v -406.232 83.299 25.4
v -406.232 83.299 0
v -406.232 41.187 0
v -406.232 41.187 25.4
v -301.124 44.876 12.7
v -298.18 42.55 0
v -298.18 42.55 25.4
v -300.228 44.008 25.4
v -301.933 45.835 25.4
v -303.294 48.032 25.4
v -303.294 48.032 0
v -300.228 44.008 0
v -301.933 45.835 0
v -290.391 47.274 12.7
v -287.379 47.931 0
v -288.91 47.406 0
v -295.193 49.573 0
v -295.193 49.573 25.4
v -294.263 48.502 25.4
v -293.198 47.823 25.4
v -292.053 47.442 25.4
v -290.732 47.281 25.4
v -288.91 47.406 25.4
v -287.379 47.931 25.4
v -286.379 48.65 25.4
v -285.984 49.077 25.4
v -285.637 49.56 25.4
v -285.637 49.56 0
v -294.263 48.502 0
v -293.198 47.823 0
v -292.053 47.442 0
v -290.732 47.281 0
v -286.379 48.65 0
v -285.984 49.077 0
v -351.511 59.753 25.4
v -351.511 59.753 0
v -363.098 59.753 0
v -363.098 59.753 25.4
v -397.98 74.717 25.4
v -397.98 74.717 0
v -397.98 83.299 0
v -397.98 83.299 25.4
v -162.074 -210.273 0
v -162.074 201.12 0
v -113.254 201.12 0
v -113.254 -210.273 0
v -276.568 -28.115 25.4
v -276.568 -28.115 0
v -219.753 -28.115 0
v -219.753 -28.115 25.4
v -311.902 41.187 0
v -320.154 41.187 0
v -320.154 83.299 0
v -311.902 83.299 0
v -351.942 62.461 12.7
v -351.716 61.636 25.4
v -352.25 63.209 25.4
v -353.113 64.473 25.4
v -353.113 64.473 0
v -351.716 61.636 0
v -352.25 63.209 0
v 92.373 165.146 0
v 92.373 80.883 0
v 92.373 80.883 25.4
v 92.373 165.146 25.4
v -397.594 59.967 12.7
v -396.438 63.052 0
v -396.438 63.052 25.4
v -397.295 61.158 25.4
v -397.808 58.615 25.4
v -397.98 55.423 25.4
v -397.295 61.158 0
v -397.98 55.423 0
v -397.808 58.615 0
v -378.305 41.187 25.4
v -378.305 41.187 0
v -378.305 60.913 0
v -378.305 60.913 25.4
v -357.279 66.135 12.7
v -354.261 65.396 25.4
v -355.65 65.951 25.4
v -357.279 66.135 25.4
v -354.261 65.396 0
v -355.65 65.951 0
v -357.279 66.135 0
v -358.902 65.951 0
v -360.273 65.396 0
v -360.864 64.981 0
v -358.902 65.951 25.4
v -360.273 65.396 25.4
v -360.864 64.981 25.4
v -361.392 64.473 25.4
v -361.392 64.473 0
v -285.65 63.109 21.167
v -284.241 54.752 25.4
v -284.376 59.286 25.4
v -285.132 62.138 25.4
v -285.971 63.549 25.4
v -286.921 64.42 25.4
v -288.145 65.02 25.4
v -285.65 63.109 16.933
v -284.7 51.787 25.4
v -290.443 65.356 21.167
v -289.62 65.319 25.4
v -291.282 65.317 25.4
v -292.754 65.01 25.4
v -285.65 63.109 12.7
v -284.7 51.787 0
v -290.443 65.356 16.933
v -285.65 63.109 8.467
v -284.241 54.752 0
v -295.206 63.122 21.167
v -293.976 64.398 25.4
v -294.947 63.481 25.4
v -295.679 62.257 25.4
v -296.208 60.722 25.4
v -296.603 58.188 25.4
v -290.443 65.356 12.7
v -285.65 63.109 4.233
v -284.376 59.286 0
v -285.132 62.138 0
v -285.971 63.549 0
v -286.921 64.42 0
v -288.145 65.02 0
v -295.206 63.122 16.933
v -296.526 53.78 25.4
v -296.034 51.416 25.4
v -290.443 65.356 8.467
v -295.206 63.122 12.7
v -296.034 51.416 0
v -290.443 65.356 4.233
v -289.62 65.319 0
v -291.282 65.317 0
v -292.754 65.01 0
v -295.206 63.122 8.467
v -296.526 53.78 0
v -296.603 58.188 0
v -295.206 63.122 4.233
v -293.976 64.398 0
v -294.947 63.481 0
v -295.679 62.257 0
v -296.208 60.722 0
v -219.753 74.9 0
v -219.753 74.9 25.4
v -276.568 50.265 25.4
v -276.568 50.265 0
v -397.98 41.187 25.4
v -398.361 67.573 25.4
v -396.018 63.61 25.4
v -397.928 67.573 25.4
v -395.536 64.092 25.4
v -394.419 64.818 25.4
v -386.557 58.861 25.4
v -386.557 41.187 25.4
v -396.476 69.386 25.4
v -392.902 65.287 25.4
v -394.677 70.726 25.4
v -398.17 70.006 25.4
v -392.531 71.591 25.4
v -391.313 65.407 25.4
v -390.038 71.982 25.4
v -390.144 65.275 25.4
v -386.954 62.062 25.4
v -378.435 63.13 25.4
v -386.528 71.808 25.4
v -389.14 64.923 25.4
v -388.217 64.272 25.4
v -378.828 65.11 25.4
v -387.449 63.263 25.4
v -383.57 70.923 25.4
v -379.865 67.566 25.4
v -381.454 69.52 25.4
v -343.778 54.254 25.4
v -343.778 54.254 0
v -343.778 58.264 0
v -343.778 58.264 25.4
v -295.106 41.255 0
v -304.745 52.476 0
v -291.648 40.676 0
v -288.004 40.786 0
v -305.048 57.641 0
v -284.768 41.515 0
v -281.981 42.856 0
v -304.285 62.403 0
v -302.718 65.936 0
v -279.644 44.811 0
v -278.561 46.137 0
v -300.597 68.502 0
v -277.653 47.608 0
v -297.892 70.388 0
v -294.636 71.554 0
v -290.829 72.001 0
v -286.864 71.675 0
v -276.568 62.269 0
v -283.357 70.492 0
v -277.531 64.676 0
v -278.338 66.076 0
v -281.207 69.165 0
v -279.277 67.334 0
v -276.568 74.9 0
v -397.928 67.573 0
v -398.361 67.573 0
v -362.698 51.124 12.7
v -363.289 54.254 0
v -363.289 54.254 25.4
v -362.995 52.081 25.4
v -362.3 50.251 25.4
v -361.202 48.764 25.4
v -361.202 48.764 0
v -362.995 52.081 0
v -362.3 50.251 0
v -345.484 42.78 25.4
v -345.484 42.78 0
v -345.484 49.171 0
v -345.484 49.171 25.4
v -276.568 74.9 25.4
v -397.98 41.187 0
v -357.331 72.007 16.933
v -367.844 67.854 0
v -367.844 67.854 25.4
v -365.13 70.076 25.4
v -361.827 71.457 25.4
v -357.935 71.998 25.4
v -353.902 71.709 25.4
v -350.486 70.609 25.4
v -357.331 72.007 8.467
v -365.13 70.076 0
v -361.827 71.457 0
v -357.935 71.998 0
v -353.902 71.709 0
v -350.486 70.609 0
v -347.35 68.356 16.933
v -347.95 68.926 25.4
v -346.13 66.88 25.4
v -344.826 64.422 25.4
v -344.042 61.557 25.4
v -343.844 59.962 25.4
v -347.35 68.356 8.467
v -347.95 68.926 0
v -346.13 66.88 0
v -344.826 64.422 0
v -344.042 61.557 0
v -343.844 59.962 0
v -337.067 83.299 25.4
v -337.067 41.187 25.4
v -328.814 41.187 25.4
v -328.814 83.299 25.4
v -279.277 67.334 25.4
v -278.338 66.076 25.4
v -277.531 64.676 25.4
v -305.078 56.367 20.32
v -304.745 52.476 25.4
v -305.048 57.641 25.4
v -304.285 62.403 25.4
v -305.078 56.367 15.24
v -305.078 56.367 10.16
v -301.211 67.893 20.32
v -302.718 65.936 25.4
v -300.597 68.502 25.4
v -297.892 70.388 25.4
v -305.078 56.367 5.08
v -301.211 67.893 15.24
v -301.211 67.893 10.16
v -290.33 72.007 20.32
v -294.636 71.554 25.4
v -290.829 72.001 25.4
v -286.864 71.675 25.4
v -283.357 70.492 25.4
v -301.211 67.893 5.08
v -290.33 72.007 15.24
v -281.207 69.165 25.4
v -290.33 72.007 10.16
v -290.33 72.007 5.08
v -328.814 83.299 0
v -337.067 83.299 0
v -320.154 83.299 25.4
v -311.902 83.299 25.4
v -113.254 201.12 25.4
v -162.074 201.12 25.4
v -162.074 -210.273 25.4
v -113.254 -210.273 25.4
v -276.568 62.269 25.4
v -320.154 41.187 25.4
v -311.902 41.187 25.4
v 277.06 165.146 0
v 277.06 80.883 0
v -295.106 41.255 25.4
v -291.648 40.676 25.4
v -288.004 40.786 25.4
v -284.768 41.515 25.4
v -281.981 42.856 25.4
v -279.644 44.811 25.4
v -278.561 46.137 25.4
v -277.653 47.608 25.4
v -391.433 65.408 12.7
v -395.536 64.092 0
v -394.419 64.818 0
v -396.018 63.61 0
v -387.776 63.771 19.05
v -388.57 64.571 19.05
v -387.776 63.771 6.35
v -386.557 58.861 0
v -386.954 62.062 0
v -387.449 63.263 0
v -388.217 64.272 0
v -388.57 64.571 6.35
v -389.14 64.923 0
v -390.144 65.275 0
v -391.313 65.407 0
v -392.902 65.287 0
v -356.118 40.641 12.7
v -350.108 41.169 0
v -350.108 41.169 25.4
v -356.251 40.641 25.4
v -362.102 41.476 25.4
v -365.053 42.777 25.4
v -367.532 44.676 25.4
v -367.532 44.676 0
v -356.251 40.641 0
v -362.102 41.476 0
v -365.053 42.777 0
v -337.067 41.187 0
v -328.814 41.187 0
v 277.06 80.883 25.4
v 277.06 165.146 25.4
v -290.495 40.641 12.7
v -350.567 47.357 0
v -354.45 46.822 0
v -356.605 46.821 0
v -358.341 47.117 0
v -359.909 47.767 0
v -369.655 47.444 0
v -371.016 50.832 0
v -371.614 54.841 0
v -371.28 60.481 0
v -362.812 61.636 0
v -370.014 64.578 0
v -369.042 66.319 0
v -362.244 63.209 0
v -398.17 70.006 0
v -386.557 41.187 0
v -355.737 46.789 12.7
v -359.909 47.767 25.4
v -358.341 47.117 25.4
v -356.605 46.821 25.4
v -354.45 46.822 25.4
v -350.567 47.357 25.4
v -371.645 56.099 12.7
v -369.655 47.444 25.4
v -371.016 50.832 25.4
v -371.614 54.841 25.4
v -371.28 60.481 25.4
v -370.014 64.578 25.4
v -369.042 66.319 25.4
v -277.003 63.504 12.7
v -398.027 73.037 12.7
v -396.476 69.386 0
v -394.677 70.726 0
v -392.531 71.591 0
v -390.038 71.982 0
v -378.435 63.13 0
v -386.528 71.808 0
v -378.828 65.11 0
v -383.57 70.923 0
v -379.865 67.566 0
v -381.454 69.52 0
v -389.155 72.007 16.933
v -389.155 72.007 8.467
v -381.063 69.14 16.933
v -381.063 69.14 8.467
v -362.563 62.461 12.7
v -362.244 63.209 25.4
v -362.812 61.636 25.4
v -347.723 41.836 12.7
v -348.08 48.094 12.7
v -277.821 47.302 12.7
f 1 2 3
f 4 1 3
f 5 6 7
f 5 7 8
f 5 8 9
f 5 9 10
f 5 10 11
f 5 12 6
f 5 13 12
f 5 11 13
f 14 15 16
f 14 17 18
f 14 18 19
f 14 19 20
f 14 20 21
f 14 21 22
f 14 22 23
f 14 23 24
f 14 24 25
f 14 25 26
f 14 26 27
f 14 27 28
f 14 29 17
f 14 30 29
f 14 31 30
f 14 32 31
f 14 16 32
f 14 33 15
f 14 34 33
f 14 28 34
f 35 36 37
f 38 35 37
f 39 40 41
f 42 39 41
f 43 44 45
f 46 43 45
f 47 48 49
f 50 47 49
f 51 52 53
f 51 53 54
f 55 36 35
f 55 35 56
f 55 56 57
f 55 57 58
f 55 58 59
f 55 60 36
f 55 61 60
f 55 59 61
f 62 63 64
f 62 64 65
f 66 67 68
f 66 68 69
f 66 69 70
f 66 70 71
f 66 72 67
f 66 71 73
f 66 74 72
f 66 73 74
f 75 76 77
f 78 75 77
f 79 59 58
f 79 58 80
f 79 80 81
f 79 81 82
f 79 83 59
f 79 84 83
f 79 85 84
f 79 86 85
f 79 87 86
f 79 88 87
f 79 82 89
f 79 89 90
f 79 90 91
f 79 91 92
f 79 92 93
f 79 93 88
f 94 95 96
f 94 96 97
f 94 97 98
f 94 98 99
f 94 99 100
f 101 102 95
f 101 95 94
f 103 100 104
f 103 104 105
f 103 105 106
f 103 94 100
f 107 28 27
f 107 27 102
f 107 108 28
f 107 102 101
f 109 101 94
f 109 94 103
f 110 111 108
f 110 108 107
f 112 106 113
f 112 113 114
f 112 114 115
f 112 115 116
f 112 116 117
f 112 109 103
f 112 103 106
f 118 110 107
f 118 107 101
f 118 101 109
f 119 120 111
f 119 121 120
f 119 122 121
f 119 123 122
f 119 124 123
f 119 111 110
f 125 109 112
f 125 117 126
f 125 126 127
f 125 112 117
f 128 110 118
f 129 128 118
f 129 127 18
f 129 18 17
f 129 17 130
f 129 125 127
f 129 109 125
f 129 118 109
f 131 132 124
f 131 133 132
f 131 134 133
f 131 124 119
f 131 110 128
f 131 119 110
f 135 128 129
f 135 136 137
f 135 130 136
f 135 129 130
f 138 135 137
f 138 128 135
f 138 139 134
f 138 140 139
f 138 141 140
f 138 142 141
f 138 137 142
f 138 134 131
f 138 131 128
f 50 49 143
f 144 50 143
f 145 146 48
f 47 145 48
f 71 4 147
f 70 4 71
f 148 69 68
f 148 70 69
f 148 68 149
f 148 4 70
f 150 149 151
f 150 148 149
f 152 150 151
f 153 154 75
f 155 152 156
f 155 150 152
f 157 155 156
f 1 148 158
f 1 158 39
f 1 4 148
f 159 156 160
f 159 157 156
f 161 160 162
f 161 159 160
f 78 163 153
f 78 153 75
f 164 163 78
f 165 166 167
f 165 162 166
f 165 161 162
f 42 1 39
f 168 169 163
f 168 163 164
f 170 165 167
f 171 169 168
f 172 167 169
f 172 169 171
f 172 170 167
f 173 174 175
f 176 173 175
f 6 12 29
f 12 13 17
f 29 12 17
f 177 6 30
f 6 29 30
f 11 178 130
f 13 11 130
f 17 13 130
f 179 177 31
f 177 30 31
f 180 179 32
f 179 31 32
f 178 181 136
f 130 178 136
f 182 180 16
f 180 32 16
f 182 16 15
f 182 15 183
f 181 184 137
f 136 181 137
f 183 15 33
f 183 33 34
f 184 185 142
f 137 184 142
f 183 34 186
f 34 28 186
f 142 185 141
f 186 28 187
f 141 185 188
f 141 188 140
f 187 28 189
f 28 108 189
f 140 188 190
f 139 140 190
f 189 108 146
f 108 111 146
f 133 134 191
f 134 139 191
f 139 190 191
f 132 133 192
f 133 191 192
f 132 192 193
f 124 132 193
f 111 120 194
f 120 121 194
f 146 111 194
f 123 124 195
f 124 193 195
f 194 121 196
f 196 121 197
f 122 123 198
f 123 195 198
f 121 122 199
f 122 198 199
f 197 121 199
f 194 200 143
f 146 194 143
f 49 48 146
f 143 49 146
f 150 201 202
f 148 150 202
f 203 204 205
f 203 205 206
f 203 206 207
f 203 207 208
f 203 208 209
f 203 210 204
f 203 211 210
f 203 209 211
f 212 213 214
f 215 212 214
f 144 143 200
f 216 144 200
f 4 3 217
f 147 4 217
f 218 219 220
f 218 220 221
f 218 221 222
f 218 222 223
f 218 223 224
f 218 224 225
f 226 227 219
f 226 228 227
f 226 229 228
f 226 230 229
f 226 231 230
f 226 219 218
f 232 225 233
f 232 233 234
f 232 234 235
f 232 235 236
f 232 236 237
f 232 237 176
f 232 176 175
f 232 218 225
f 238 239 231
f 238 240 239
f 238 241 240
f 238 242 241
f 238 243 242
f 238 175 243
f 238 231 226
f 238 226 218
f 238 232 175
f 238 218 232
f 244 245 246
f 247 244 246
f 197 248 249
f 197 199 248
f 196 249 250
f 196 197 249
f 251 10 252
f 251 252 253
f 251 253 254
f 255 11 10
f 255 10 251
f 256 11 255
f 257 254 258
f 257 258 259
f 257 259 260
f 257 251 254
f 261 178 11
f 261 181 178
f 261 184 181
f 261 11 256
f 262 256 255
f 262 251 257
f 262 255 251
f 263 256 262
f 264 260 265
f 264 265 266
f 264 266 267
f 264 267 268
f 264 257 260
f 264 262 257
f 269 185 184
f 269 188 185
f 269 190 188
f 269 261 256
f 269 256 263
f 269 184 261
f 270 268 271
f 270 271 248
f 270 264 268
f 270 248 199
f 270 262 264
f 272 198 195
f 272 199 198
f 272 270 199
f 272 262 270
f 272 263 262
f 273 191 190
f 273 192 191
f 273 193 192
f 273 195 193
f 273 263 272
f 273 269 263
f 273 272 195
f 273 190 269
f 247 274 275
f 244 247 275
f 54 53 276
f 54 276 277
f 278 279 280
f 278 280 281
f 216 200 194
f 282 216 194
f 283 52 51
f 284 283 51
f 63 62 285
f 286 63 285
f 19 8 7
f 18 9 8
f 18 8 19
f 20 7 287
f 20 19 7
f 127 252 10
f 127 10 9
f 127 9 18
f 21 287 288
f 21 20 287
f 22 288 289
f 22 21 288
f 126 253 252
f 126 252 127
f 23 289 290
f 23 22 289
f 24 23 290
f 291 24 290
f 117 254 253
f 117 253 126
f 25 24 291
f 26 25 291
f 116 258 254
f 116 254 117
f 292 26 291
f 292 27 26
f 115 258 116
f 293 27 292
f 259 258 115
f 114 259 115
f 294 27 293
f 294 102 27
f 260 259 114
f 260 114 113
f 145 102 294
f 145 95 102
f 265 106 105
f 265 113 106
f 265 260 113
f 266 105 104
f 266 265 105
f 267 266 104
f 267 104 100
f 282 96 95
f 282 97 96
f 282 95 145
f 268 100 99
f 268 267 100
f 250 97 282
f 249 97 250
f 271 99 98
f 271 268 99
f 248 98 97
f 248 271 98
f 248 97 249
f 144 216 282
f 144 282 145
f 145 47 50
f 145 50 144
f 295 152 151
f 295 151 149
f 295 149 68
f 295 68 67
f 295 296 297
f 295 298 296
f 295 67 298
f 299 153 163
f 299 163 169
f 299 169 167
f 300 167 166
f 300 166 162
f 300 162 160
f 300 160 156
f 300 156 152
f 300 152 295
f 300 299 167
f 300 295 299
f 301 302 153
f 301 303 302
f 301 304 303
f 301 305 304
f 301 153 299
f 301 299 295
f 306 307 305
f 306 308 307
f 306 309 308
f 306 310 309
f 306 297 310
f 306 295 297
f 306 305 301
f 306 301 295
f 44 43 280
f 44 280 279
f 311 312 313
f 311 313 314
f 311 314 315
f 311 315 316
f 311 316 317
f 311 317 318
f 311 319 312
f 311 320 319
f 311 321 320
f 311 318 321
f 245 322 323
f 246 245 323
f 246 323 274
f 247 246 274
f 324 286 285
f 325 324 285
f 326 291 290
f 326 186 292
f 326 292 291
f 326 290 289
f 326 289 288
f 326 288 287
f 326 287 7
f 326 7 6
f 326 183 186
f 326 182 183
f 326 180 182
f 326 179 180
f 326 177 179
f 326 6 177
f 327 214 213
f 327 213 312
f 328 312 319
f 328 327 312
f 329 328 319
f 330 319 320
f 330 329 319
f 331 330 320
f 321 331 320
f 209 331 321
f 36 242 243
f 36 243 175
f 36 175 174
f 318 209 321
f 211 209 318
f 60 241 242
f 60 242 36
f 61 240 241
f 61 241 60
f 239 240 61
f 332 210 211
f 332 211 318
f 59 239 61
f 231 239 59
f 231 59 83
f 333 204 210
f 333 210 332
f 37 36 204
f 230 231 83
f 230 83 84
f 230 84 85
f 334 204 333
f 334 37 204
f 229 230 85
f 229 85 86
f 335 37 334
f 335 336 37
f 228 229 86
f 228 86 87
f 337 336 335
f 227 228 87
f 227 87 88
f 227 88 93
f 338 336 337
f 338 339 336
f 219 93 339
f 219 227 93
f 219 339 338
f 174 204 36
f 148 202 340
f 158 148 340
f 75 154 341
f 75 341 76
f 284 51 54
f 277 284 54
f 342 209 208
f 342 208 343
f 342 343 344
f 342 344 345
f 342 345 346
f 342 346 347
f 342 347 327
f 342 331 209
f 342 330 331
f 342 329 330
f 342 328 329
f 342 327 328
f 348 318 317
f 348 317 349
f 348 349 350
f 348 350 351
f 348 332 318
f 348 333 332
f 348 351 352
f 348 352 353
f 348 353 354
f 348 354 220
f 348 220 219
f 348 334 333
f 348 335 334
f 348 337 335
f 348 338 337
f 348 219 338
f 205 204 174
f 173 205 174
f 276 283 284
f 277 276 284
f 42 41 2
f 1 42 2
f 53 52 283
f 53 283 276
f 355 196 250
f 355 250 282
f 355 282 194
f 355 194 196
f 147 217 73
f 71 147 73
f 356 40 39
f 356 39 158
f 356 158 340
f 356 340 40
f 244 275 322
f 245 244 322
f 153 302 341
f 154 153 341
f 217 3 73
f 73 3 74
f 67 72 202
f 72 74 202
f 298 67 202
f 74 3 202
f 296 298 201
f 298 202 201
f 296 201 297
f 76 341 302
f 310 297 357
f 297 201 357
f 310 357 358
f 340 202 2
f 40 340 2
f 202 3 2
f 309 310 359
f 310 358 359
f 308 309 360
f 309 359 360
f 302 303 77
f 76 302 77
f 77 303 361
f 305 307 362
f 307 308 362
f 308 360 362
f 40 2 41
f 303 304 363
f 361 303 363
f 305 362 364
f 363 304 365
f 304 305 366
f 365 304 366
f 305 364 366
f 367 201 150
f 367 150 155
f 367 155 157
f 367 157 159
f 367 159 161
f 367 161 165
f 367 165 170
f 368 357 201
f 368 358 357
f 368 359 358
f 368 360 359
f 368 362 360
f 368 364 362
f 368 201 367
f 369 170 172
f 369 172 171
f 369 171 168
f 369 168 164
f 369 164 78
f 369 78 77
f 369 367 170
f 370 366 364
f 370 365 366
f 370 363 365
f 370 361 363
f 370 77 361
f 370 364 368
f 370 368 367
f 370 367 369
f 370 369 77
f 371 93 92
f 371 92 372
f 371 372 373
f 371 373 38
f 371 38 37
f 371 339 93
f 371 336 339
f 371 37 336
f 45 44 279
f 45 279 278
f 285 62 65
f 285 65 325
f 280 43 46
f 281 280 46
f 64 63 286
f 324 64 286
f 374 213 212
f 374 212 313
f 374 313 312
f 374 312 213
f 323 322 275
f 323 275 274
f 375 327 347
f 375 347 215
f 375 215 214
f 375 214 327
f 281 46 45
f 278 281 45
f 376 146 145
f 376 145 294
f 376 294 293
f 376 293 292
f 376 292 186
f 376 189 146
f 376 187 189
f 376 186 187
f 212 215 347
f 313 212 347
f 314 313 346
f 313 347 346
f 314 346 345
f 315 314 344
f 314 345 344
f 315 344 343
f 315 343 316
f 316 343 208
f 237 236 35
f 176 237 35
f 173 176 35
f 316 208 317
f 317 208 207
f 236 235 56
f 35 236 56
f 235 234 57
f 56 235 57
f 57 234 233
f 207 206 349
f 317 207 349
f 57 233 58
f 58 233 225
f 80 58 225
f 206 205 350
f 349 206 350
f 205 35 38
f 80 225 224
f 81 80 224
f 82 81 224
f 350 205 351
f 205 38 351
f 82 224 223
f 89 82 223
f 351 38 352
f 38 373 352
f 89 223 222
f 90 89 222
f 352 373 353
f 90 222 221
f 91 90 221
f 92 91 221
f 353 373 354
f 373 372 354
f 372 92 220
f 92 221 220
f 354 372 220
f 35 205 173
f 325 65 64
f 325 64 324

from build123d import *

# Parameters (mm, degrees)
F0_W     = 184.6868768334
F0_H     = 84.2627063394
F0_W_2   = 48.8200113177
F0_H_2   = 411.3924652338
F0_W_3   = 8.2527426776
F0_H_3   = 42.1123689836
F1_DEPTH = 25.4


with BuildPart() as f1:
    # F0 (on Top) → F1 (new body)
    with BuildSketch(Plane.XY):
        with Locations((184.7166828811, 123.0147741735)):
            Rectangle(F0_W, F0_H)
        with Locations((-137.6638747752, -4.5765265822)):
            Rectangle(F0_W_2, F0_H_2)
        with BuildLine():
            Line((-386.5573875373, 41.1865082052), (-378.3046448597, 41.1865082052))
            Line((-378.3046448597, 41.1865082052), (-378.3046448597, 60.9134209226))
            add(Edge.make_bspline(
                [(-381.0627755447, 69.1401843473), (-378.3046448597, 66.2738067751), (-378.3046448597, 60.9134209226)],
                knots=[0, 0, 0, 1, 1, 1], degree=2))
            add(Edge.make_bspline(
                [(-389.1553128293, 72.0065619195), (-383.8209062297, 72.0065619195), (-381.0627755447, 69.1401843473)],
                knots=[0, 0, 0, 1, 1, 1], degree=2))
            add(Edge.make_bspline(
                [(-397.9276405654, 67.5727694211), (-395.1651800049, 72.0065619195), (-389.1553128293, 72.0065619195)],
                knots=[0, 0, 0, 1, 1, 1], degree=2))
            Line((-397.9276405654, 67.5727694211), (-398.3606281141, 67.5727694211))
            Line((-398.3606281141, 67.5727694211), (-398.1701135926, 70.0061594447))
            add(Edge.make_bspline(
                [(-397.9795990712, 74.7170639742), (-397.9795990712, 73.7125328613), (-398.1701135926, 70.0061594447)],
                knots=[0, 0, 0, 1, 1, 1], degree=2))
            Line((-397.9795990712, 74.7170639742), (-397.9795990712, 83.2988771888))
            Line((-397.9795990712, 83.2988771888), (-406.2323417489, 83.2988771888))
            Line((-406.2323417489, 83.2988771888), (-406.2323417489, 41.1865082052))
            Line((-406.2323417489, 41.1865082052), (-397.9795990712, 41.1865082052))
            Line((-397.9795990712, 41.1865082052), (-397.9795990712, 55.4231388055))
            add(Edge.make_bspline(
                [(-396.438163398, 63.052379413), (-397.9795990712, 60.6969271483), (-397.9795990712, 55.4231388055)],
                knots=[0, 0, 0, 1, 1, 1], degree=2))
            add(Edge.make_bspline(
                [(-391.4328273353, 65.4078316778), (-394.8967277247, 65.4078316778), (-396.438163398, 63.052379413)],
                knots=[0, 0, 0, 1, 1, 1], degree=2))
            add(Edge.make_bspline(
                [(-386.5573875373, 58.8610599419), (-386.5573875373, 65.4078316778), (-391.4328273353, 65.4078316778)],
                knots=[0, 0, 0, 1, 1, 1], degree=2))
            Line((-386.5573875373, 58.8610599419), (-386.5573875373, 41.1865082052))
        make_face()
        Polygon((-336.9529306078, 41.1865082052), (-328.8141680467, 41.1865082052), (-328.8141680467, 83.2988771888), (-337.0669107244, 83.2988771888), (-337.0669107244, 41.1865082052), align=None)
        with Locations((-316.0280457345, 62.242692697)):
            Rectangle(F0_W_3, F0_H_3)
        with BuildLine():
            Line((-276.5679955482, 50.2645032945), (-276.5679955482, -28.1147938222))
            Line((-276.5679955482, -28.1147938222), (-219.7534025482, -28.1147938222))
            Line((-219.7534025482, -28.1147938222), (-219.7534025482, 74.9002173543))
            Line((-219.7534025482, 74.9002173543), (-276.5679955482, 74.9002173543))
            Line((-276.5679955482, 74.9002173543), (-276.5679955482, 62.2686307575))
            add(Edge.make_bspline(
                [(-276.5679955482, 62.2686307575), (-275.7472140818, 59.5977436271), (-275.7472140818, 56.3670516616)],
                knots=[0.3216911884, 0.3216911884, 0.3216911884, 1, 1, 1], degree=2))
            add(Edge.make_bspline(
                [(-275.7472140818, 56.3670516616), (-275.7472140818, 52.9769771283), (-276.5679955482, 50.2645032945)],
                knots=[0, 0, 0, 0.4589388385, 0.4589388385, 0.4589388385], degree=2))
        make_face()
        with BuildLine():
            add(Edge.make_bspline(
                [(-356.1183628659, 40.6409438939), (-363.4185329364, 40.6409438939), (-367.5319146488, 44.6763878475)],
                knots=[0, 0, 0, 1, 1, 1], degree=2))
            add(Edge.make_bspline(
                [(-350.1084956903, 41.1691887033), (-352.5678649668, 40.6409438939), (-356.1183628659, 40.6409438939)],
                knots=[0, 0, 0, 1, 1, 1], degree=2))
            add(Edge.make_bspline(
                [(-345.4841886705, 42.7799023843), (-347.6491264139, 41.6974335126), (-350.1084956903, 41.1691887033)],
                knots=[0, 0, 0, 1, 1, 1], degree=2))
            Line((-345.4841886705, 42.7799023843), (-345.4841886705, 49.1707986027))
            add(Edge.make_bspline(
                [(-350.5674624919, 47.3565807737), (-348.1340724684, 47.9237944625), (-345.4841886705, 49.1707986027)],
                knots=[0, 0, 0, 1, 1, 1], degree=2))
            add(Edge.make_bspline(
                [(-355.737333823, 46.789367085), (-353.0008525154, 46.789367085), (-350.5674624919, 47.3565807737)],
                knots=[0, 0, 0, 1, 1, 1], degree=2))
            add(Edge.make_bspline(
                [(-361.2016366872, 48.7637903069), (-359.2531927182, 46.789367085), (-355.737333823, 46.789367085)],
                knots=[0, 0, 0, 1, 1, 1], degree=2))
            add(Edge.make_bspline(
                [(-363.2886366718, 54.2540724241), (-363.1500806562, 50.7382135289), (-361.2016366872, 48.7637903069)],
                knots=[0, 0, 0, 1, 1, 1], degree=2))
            Line((-363.2886366718, 54.2540724241), (-343.7782177288, 54.2540724241))
            Line((-343.7782177288, 54.2540724241), (-343.7782177288, 58.2635371247))
            add(Edge.make_bspline(
                [(-347.3503650053, 68.3564768842), (-343.7782177288, 64.7063918489), (-343.7782177288, 58.2635371247)],
                knots=[0, 0, 0, 1, 1, 1], degree=2))
            add(Edge.make_bspline(
                [(-357.3307280021, 72.0065619195), (-350.9225122818, 72.0065619195), (-347.3503650053, 68.3564768842)],
                knots=[0, 0, 0, 1, 1, 1], degree=2))
            add(Edge.make_bspline(
                [(-367.8436656838, 67.8542113278), (-364.0420350065, 72.0065619195), (-357.3307280021, 72.0065619195)],
                knots=[0, 0, 0, 1, 1, 1], degree=2))
            add(Edge.make_bspline(
                [(-371.6452963611, 56.0985993814), (-371.6452963611, 63.701860736), (-367.8436656838, 67.8542113278)],
                knots=[0, 0, 0, 1, 1, 1], degree=2))
            add(Edge.make_bspline(
                [(-367.5319146488, 44.6763878475), (-371.6452963611, 48.7118318011), (-371.6452963611, 56.0985993814)],
                knots=[0, 0, 0, 1, 1, 1], degree=2))
        make_face()
        with BuildLine():
            add(Edge.make_bspline(
                [(-357.2787694963, 66.1352507595), (-359.9026740412, 66.1352507595), (-361.3921512086, 64.4725785727)],
                knots=[0, 0, 0, 1, 1, 1], degree=2))
            add(Edge.make_bspline(
                [(-353.1134292781, 64.4725785727), (-354.6548649513, 66.1352507595), (-357.2787694963, 66.1352507595)],
                knots=[0, 0, 0, 1, 1, 1], degree=2))
            add(Edge.make_bspline(
                [(-351.511375348, 59.7530142922), (-351.5719936048, 62.8099063858), (-353.1134292781, 64.4725785727)],
                knots=[0, 0, 0, 1, 1, 1], degree=2))
            Line((-351.511375348, 59.7530142922), (-363.0981221504, 59.7530142922))
            add(Edge.make_bspline(
                [(-361.3921512086, 64.4725785727), (-362.8816283761, 62.8099063858), (-363.0981221504, 59.7530142922)],
                knots=[0, 0, 0, 1, 1, 1], degree=2))
        make_face(mode=Mode.SUBTRACT)
        with BuildLine():
            add(Edge.make_bspline(
                [(-276.5679955482, 50.2645032945), (-277.5356473057, 47.0666605317), (-279.6441020198, 44.8106139876)],
                knots=[0.4589388385, 0.4589388385, 0.4589388385, 1, 1, 1], degree=2))
            Line((-276.5679955482, 50.2645032945), (-276.5679955482, 62.2686307575))
            add(Edge.make_bspline(
                [(-277.5311227823, 64.6760827205), (-276.9572550725, 63.5353117149), (-276.5679955482, 62.2686307575)],
                knots=[0, 0, 0, 0.3216911884, 0.3216911884, 0.3216911884], degree=2))
            add(Edge.make_bspline(
                [(-282.6447057321, 70.1144063318), (-279.3150314828, 68.2222507441), (-277.5311227823, 64.6760827205)],
                knots=[0, 0, 0, 1, 1, 1], degree=2))
            add(Edge.make_bspline(
                [(-290.330234721, 72.0065619195), (-285.9743799814, 72.0065619195), (-282.6447057321, 70.1144063318)],
                knots=[0, 0, 0, 1, 1, 1], degree=2))
            add(Edge.make_bspline(
                [(-301.2112118191, 67.8931802071), (-297.3446330094, 72.0065619195), (-290.330234721, 72.0065619195)],
                knots=[0, 0, 0, 1, 1, 1], degree=2))
            add(Edge.make_bspline(
                [(-305.0777906287, 56.3670516616), (-305.0777906287, 63.7797984948), (-301.2112118191, 67.8931802071)],
                knots=[0, 0, 0, 1, 1, 1], degree=2))
            add(Edge.make_bspline(
                [(-303.2938819282, 48.0320413497), (-305.0777906287, 51.6041886262), (-305.0777906287, 56.3670516616)],
                knots=[0, 0, 0, 1, 1, 1], degree=2))
            add(Edge.make_bspline(
                [(-298.1802989784, 42.5504189835), (-301.5099732276, 44.4598940731), (-303.2938819282, 48.0320413497)],
                knots=[0, 0, 0, 1, 1, 1], degree=2))
            add(Edge.make_bspline(
                [(-290.4947699895, 40.6409438939), (-294.8506247291, 40.6409438939), (-298.1802989784, 42.5504189835)],
                knots=[0, 0, 0, 1, 1, 1], degree=2))
            add(Edge.make_bspline(
                [(-279.6441020198, 44.8106139876), (-283.5409899579, 40.6409438939), (-290.4947699895, 40.6409438939)],
                knots=[0, 0, 0, 1, 1, 1], degree=2))
        make_face()
        with BuildLine():
            add(Edge.make_bspline(
                [(-296.6691724335, 56.3670516616), (-296.6691724335, 51.8726409064), (-295.1926848926, 49.5734770229)],
                knots=[0, 0, 0, 1, 1, 1], degree=2))
            add(Edge.make_bspline(
                [(-295.205674519, 63.1216574208), (-296.6691724335, 60.8874416697), (-296.6691724335, 56.3670516616)],
                knots=[0, 0, 0, 1, 1, 1], degree=2))
            add(Edge.make_bspline(
                [(-290.4428114836, 65.3558731719), (-293.7421766045, 65.3558731719), (-295.205674519, 63.1216574208)],
                knots=[0, 0, 0, 1, 1, 1], degree=2))
            add(Edge.make_bspline(
                [(-285.6496393199, 63.1086677943), (-287.1088073589, 65.3558731719), (-290.4428114836, 65.3558731719)],
                knots=[0, 0, 0, 1, 1, 1], degree=2))
            add(Edge.make_bspline(
                [(-284.1904712809, 56.3670516616), (-284.1904712809, 60.8614624167), (-285.6496393199, 63.1086677943)],
                knots=[0, 0, 0, 1, 1, 1], degree=2))
            add(Edge.make_bspline(
                [(-285.6366496934, 49.5604873965), (-284.1904712809, 51.8466616534), (-284.1904712809, 56.3670516616)],
                knots=[0, 0, 0, 1, 1, 1], degree=2))
            add(Edge.make_bspline(
                [(-290.3908529778, 47.2743131395), (-287.082828106, 47.2743131395), (-285.6366496934, 49.5604873965)],
                knots=[0, 0, 0, 1, 1, 1], degree=2))
            add(Edge.make_bspline(
                [(-295.1926848926, 49.5734770229), (-293.7161973516, 47.2743131395), (-290.3908529778, 47.2743131395)],
                knots=[0, 0, 0, 1, 1, 1], degree=2))
        make_face(mode=Mode.SUBTRACT)
        with BuildLine():
            Line((-276.5679955482, 62.2686307575), (-276.5679955482, 50.2645032945))
            add(Edge.make_bspline(
                [(-275.7472140818, 56.3670516616), (-275.7472140818, 52.9769771283), (-276.5679955482, 50.2645032945)],
                knots=[0, 0, 0, 0.4589388385, 0.4589388385, 0.4589388385], degree=2))
            add(Edge.make_bspline(
                [(-276.5679955482, 62.2686307575), (-275.7472140818, 59.5977436271), (-275.7472140818, 56.3670516616)],
                knots=[0.3216911884, 0.3216911884, 0.3216911884, 1, 1, 1], degree=2))
        make_face()
    extrude(amount=F1_DEPTH)


solid = f1.part
